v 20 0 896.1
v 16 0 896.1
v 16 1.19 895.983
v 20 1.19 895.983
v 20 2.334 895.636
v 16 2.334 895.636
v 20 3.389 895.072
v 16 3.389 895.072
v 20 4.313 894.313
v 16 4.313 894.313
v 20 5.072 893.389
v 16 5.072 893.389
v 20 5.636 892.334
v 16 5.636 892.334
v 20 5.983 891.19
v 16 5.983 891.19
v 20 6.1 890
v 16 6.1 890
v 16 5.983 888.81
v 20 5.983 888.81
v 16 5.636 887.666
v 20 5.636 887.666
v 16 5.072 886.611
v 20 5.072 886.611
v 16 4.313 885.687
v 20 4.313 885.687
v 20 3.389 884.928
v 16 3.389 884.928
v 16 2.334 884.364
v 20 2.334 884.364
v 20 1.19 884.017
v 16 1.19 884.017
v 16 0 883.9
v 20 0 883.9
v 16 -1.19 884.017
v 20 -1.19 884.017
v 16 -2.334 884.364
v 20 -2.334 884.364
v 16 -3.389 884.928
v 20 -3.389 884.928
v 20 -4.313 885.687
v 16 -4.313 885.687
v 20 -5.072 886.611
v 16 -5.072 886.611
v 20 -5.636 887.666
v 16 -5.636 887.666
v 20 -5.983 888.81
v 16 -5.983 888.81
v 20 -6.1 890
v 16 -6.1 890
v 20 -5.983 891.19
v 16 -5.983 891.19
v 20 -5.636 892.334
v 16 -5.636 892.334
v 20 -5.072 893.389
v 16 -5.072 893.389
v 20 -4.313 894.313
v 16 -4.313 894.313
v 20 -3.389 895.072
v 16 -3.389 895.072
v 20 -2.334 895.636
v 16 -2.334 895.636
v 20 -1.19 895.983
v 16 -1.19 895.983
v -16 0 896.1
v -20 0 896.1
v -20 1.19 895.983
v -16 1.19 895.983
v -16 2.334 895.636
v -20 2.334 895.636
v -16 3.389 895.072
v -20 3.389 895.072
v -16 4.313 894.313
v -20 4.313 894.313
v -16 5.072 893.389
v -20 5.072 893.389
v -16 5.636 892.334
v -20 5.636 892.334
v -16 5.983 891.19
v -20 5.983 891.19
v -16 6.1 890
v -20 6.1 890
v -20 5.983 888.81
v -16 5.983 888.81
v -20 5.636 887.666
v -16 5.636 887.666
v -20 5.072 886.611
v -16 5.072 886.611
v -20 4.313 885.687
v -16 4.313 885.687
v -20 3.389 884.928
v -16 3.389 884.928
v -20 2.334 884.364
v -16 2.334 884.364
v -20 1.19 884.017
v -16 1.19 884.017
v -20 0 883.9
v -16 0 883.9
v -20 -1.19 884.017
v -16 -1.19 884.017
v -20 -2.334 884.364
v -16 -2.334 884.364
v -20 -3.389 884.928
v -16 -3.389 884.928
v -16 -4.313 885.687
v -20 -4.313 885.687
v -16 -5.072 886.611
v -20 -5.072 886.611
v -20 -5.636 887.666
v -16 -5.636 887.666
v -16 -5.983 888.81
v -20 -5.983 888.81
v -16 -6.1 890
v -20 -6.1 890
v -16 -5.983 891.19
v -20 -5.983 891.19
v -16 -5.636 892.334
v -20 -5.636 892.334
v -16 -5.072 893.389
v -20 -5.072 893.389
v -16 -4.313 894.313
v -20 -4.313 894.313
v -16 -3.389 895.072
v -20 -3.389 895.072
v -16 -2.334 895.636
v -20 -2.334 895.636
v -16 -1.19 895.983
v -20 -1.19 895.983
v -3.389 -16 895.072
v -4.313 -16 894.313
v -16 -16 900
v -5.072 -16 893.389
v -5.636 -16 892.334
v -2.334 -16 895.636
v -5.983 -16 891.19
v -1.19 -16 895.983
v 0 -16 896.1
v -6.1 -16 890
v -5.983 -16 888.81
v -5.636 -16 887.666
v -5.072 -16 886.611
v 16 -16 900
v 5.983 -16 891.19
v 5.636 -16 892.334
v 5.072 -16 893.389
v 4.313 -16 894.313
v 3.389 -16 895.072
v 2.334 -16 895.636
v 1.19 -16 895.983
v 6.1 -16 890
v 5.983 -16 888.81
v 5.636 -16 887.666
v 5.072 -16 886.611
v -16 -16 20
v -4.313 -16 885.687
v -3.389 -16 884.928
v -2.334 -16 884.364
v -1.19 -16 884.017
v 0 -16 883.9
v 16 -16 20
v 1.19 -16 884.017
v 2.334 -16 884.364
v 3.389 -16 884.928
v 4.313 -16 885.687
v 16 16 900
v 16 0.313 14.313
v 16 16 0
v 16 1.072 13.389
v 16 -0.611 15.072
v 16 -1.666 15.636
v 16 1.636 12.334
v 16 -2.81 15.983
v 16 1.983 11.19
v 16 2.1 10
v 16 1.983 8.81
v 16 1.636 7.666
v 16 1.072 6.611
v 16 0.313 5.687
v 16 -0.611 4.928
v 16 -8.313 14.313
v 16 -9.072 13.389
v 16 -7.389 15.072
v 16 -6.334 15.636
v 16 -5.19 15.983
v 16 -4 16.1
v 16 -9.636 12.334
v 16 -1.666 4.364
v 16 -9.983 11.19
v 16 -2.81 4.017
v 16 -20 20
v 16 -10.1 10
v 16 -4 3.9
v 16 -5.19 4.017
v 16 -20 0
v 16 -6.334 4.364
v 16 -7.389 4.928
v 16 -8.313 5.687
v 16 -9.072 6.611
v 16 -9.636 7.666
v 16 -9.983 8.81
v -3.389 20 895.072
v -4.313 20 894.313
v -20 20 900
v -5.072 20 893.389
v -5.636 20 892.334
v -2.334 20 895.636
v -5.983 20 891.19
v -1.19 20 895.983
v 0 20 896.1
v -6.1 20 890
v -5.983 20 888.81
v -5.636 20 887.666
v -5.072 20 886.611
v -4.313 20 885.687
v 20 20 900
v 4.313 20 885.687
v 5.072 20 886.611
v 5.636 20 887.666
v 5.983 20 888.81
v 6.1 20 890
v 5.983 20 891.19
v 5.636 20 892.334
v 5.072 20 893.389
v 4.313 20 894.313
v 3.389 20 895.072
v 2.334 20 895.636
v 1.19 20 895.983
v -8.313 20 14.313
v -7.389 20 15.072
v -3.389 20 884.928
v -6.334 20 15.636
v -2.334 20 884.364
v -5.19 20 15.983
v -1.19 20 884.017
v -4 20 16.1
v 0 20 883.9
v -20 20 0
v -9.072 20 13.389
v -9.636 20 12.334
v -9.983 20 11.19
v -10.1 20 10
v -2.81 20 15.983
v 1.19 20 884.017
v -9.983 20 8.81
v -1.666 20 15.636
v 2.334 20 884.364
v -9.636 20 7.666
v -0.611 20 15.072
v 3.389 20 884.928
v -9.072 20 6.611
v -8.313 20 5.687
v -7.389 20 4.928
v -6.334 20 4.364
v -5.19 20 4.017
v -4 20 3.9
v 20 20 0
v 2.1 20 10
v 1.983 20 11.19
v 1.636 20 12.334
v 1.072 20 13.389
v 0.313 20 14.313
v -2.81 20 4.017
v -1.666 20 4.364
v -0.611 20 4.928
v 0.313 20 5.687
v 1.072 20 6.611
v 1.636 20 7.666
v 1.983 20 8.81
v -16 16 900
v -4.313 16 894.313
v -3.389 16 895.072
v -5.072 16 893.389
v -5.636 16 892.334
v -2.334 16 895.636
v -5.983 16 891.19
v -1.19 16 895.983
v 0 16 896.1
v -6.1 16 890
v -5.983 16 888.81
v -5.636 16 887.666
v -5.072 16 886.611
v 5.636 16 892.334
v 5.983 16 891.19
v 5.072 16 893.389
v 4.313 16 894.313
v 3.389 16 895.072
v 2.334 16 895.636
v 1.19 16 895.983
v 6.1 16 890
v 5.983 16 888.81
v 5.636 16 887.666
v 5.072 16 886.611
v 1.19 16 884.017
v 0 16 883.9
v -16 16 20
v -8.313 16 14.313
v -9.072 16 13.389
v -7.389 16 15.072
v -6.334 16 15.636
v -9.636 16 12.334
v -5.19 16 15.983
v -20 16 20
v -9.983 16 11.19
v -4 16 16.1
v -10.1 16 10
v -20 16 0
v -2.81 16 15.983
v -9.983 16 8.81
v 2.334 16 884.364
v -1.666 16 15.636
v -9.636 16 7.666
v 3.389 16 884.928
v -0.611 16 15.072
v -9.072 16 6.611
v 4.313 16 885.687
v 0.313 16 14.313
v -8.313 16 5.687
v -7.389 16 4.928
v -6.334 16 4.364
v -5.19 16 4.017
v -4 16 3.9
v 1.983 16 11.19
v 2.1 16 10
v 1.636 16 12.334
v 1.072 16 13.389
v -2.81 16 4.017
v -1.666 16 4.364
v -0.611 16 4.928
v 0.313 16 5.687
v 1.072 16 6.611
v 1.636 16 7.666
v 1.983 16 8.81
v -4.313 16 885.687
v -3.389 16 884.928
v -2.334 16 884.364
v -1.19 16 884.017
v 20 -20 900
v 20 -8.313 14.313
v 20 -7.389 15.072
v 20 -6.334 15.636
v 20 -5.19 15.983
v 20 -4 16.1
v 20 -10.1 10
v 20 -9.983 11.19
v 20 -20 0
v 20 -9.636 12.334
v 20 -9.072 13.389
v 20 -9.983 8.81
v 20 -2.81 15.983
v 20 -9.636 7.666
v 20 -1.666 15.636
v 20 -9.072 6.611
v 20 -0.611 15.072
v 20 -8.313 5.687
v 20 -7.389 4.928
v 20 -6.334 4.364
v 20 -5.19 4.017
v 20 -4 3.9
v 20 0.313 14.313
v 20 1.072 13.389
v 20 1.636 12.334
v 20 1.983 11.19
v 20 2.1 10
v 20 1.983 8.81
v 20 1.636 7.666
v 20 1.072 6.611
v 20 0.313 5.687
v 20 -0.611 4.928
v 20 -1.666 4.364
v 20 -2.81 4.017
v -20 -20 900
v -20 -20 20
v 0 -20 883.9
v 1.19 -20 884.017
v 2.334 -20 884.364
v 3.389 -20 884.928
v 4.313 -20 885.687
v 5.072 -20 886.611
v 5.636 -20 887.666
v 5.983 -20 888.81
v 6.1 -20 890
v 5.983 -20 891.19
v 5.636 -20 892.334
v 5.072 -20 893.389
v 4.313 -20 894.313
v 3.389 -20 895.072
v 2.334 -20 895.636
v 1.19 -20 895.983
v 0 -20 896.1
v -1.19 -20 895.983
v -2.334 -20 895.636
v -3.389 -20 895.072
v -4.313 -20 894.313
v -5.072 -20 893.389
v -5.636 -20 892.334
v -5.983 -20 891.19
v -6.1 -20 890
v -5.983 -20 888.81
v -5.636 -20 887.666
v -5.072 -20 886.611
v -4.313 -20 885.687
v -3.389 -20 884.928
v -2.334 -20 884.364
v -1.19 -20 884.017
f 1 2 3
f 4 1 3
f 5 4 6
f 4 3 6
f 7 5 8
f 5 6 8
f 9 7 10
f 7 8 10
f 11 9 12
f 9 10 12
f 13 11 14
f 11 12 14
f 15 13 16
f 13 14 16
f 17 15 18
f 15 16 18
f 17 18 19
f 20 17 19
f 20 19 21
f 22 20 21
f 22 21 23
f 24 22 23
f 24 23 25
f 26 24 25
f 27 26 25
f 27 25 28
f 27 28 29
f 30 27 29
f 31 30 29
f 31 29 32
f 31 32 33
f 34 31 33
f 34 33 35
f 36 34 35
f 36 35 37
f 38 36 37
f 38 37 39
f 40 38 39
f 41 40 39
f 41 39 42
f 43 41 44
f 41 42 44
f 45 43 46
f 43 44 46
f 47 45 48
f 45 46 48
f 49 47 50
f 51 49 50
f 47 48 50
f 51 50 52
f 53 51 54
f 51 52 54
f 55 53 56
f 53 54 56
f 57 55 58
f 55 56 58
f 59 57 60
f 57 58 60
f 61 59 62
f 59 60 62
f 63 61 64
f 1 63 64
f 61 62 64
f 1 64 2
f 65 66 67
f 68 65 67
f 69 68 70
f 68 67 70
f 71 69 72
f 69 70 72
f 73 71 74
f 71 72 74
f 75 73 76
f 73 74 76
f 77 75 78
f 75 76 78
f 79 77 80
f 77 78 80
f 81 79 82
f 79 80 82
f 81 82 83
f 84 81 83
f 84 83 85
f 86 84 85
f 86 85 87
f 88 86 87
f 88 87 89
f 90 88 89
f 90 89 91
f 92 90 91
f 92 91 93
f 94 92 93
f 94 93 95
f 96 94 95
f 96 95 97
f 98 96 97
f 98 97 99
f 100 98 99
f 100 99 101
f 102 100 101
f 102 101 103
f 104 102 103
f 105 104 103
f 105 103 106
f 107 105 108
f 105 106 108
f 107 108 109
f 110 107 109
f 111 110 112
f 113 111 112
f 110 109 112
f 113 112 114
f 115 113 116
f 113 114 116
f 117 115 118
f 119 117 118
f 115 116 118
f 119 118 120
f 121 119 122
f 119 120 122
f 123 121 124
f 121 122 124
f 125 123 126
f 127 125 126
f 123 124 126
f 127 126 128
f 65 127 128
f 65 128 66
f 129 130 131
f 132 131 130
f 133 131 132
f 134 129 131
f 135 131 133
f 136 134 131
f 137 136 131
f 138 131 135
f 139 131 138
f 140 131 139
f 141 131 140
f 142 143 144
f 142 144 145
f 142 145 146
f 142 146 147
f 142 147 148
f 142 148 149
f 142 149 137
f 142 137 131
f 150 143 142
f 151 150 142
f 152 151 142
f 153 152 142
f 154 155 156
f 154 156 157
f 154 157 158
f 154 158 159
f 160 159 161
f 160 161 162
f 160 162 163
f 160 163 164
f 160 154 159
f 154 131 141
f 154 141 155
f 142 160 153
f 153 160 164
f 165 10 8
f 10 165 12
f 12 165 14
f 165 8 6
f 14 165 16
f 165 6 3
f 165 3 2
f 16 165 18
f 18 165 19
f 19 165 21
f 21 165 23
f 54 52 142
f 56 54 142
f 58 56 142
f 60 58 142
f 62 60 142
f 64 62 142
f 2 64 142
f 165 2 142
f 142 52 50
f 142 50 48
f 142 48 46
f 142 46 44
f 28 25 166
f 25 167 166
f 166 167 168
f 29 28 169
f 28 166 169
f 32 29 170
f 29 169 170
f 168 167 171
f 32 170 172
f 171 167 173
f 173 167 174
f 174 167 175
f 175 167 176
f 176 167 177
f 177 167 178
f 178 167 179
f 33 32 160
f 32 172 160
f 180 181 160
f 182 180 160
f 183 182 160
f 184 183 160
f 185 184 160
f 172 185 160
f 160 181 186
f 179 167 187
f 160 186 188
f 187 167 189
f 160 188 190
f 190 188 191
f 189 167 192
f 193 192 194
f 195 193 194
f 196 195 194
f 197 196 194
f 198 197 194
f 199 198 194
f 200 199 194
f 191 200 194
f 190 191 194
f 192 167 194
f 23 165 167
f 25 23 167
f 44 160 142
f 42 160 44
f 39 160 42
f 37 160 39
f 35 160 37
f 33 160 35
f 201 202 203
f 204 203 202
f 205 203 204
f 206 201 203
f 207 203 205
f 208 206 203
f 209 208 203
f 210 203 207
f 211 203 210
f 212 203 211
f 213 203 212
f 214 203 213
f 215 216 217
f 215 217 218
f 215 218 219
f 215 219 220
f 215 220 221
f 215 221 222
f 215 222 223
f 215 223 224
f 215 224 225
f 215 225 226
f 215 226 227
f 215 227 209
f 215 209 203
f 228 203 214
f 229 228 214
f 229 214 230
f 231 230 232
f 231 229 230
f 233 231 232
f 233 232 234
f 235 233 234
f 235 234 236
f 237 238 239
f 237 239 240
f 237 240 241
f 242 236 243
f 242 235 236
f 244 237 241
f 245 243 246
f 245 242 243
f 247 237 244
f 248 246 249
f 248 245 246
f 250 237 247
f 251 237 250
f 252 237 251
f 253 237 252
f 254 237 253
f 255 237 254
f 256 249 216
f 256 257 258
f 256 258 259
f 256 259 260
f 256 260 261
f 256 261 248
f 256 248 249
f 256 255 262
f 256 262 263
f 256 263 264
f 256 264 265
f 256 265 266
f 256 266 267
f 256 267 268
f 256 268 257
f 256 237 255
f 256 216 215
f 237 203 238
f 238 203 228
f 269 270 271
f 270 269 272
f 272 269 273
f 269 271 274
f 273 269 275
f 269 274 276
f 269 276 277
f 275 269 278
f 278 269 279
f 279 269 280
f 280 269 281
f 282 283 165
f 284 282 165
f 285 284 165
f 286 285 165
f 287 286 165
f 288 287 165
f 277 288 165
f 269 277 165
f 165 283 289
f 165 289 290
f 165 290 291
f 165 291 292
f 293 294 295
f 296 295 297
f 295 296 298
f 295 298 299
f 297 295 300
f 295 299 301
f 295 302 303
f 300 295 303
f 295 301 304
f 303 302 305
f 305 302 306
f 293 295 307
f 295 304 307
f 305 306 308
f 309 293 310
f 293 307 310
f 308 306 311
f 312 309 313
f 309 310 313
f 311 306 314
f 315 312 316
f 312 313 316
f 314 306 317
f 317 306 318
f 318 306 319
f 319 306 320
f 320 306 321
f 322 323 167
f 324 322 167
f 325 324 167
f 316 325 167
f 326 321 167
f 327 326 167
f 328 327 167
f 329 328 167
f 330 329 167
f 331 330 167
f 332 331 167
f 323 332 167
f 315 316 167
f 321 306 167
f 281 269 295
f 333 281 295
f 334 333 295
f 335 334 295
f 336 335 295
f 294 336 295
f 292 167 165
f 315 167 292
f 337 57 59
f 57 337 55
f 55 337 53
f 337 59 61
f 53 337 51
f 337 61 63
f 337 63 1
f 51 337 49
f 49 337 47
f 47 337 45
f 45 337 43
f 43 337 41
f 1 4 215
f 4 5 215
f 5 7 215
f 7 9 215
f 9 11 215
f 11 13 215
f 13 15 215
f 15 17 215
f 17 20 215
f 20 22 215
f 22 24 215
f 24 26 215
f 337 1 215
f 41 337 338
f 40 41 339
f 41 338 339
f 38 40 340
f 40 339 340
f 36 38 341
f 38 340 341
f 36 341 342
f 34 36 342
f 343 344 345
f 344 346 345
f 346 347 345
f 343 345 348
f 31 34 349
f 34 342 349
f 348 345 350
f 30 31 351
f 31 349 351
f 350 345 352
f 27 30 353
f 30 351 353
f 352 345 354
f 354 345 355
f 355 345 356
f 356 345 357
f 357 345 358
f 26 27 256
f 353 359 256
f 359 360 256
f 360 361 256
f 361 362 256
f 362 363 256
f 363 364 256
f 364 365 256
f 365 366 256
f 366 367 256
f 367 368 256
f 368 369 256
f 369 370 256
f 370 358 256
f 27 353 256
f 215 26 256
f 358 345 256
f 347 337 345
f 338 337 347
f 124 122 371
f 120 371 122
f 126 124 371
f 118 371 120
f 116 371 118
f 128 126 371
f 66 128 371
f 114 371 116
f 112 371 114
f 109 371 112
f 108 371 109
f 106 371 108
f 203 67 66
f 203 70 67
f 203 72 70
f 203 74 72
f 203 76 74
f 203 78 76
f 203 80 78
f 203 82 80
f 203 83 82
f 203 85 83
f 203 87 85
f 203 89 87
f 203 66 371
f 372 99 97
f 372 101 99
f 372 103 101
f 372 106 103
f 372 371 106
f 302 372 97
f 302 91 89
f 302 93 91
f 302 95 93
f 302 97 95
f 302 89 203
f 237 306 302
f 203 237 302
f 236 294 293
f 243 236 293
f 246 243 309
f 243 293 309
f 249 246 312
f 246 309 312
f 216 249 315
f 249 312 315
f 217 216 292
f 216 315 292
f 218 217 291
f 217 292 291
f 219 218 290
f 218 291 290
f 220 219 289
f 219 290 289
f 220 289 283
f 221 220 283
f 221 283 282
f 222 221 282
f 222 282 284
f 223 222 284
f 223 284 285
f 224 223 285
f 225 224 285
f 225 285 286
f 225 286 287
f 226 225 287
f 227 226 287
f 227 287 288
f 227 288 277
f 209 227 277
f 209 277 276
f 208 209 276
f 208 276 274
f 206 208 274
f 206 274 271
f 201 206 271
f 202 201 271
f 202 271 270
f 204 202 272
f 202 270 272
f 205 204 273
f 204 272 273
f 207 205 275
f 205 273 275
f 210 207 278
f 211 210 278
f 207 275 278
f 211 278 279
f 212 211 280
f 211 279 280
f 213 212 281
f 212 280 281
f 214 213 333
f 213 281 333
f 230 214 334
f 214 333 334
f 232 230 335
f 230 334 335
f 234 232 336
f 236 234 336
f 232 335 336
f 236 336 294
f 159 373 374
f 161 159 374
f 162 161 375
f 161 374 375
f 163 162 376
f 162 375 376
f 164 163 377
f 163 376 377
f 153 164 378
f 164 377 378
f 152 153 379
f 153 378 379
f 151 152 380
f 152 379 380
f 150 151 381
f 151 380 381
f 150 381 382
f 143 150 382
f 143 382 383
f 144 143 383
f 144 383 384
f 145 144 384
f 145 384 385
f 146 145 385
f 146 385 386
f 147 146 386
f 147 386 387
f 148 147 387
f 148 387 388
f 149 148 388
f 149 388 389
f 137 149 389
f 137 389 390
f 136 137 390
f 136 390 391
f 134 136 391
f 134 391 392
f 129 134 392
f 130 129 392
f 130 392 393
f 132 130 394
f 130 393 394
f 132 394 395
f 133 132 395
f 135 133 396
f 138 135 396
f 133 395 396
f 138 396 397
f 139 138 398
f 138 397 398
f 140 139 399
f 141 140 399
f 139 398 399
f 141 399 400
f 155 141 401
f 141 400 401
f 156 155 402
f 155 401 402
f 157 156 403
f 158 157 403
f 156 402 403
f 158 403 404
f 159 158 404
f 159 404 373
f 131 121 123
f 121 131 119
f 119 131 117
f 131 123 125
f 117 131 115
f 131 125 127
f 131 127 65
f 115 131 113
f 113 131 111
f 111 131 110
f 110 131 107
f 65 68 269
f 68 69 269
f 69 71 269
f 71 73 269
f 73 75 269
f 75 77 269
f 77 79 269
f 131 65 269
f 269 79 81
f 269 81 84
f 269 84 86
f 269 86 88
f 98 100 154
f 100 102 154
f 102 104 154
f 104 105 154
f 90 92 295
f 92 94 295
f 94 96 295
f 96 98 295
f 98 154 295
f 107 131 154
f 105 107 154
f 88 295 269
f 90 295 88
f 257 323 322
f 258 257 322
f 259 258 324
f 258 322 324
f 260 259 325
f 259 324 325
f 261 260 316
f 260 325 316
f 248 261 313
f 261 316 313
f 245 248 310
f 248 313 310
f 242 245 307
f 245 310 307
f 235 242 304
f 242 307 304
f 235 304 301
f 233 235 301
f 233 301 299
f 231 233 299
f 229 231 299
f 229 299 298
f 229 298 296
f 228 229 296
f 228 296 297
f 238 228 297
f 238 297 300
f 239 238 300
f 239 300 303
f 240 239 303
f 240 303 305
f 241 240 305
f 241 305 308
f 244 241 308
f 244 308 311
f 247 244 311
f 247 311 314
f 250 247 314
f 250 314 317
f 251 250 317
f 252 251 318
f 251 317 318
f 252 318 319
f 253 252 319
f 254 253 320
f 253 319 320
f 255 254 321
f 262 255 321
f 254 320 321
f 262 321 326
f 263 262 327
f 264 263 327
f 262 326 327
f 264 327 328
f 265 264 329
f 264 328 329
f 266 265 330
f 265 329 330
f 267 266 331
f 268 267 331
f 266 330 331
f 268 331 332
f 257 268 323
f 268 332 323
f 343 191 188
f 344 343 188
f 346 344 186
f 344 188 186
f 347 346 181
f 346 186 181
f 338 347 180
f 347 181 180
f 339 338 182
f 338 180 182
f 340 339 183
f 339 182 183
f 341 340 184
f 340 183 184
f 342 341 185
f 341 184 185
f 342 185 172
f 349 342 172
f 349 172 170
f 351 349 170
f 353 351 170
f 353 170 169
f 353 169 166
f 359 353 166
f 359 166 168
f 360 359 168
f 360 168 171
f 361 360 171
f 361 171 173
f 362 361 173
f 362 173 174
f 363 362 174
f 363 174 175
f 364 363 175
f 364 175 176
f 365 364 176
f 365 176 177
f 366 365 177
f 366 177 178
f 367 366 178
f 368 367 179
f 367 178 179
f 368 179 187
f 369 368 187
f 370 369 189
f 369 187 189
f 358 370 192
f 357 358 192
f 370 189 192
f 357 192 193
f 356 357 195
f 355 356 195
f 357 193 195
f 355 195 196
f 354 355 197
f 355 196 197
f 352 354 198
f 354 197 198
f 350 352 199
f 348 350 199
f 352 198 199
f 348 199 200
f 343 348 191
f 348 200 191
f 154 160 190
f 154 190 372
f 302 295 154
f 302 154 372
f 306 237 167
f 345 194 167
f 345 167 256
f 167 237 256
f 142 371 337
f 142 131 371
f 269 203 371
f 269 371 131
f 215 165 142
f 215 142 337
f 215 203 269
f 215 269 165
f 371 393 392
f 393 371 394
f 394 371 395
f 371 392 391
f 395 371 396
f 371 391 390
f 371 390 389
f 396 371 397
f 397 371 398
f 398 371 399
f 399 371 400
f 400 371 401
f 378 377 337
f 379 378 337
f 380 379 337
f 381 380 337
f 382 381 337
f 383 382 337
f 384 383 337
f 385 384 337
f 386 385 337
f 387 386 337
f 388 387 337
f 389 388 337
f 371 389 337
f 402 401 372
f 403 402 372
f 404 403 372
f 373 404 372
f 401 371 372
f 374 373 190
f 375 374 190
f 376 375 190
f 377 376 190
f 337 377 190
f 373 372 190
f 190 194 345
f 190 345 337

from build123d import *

# Parameters (mm, degrees)
SKETCH1_W           = 40
SKETCH1_H           = 40
SKETCH1_W_2         = 32
SKETCH1_H_2         = 32
BOSS_EXTRUDE1_DEPTH = 900
CUT_EXTRUDE1_DEPTH  = 20
SKETCH3_R           = 6.1
CUT_EXTRUDE2_DEPTH  = 20
SKETCH4_R           = 6.1
CUT_EXTRUDE3_DEPTH  = 20
SKETCH5_R           = 6.1
CUT_EXTRUDE4_DEPTH  = 60
SKETCH6_R           = 6.1
CUT_EXTRUDE5_DEPTH  = 60


with BuildPart() as part:
    # Sketch1 → Boss-Extrude1 (new body)
    with BuildSketch(Plane.XY):
        Rectangle(SKETCH1_W, SKETCH1_H)
        Rectangle(SKETCH1_W_2, SKETCH1_H_2, mode=Mode.SUBTRACT)
    extrude(amount=BOSS_EXTRUDE1_DEPTH)

    # Sketch2 → Cut-Extrude1 (cut)
    with BuildSketch(Plane(origin=(0, 0, 0), x_dir=(-1, 0, 0), z_dir=(0, 0, -1))):
        Polygon((-16, -16), (-16, -20), (20, -20), (20, 16), (16, 16), (16, -16), align=None)
    extrude(amount=-CUT_EXTRUDE1_DEPTH, mode=Mode.SUBTRACT)

    # Sketch3 → Cut-Extrude2 (cut)
    with BuildSketch(Plane.ZY.offset(-16)):
        with Locations((10, -4)):
            Circle(SKETCH3_R)
    extrude(amount=-CUT_EXTRUDE2_DEPTH, mode=Mode.SUBTRACT)

    # Sketch4 → Cut-Extrude3 (cut)
    with BuildSketch(Plane.XZ.offset(-16)):
        with Locations((-4, 10)):
            Circle(SKETCH4_R)
    extrude(amount=-CUT_EXTRUDE3_DEPTH, mode=Mode.SUBTRACT)

    # Sketch5 → Cut-Extrude4 (cut)
    with BuildSketch(Plane.XZ.offset(20)):
        with Locations((0, 890)):
            Circle(SKETCH5_R)
    extrude(amount=-CUT_EXTRUDE4_DEPTH, mode=Mode.SUBTRACT)

    # Sketch6 → Cut-Extrude5 (cut)
    with BuildSketch(Plane.ZY.offset(20)):
        with Locations((890, 0)):
            Circle(SKETCH6_R)
    extrude(amount=-CUT_EXTRUDE5_DEPTH, mode=Mode.SUBTRACT)


solid = part.part
